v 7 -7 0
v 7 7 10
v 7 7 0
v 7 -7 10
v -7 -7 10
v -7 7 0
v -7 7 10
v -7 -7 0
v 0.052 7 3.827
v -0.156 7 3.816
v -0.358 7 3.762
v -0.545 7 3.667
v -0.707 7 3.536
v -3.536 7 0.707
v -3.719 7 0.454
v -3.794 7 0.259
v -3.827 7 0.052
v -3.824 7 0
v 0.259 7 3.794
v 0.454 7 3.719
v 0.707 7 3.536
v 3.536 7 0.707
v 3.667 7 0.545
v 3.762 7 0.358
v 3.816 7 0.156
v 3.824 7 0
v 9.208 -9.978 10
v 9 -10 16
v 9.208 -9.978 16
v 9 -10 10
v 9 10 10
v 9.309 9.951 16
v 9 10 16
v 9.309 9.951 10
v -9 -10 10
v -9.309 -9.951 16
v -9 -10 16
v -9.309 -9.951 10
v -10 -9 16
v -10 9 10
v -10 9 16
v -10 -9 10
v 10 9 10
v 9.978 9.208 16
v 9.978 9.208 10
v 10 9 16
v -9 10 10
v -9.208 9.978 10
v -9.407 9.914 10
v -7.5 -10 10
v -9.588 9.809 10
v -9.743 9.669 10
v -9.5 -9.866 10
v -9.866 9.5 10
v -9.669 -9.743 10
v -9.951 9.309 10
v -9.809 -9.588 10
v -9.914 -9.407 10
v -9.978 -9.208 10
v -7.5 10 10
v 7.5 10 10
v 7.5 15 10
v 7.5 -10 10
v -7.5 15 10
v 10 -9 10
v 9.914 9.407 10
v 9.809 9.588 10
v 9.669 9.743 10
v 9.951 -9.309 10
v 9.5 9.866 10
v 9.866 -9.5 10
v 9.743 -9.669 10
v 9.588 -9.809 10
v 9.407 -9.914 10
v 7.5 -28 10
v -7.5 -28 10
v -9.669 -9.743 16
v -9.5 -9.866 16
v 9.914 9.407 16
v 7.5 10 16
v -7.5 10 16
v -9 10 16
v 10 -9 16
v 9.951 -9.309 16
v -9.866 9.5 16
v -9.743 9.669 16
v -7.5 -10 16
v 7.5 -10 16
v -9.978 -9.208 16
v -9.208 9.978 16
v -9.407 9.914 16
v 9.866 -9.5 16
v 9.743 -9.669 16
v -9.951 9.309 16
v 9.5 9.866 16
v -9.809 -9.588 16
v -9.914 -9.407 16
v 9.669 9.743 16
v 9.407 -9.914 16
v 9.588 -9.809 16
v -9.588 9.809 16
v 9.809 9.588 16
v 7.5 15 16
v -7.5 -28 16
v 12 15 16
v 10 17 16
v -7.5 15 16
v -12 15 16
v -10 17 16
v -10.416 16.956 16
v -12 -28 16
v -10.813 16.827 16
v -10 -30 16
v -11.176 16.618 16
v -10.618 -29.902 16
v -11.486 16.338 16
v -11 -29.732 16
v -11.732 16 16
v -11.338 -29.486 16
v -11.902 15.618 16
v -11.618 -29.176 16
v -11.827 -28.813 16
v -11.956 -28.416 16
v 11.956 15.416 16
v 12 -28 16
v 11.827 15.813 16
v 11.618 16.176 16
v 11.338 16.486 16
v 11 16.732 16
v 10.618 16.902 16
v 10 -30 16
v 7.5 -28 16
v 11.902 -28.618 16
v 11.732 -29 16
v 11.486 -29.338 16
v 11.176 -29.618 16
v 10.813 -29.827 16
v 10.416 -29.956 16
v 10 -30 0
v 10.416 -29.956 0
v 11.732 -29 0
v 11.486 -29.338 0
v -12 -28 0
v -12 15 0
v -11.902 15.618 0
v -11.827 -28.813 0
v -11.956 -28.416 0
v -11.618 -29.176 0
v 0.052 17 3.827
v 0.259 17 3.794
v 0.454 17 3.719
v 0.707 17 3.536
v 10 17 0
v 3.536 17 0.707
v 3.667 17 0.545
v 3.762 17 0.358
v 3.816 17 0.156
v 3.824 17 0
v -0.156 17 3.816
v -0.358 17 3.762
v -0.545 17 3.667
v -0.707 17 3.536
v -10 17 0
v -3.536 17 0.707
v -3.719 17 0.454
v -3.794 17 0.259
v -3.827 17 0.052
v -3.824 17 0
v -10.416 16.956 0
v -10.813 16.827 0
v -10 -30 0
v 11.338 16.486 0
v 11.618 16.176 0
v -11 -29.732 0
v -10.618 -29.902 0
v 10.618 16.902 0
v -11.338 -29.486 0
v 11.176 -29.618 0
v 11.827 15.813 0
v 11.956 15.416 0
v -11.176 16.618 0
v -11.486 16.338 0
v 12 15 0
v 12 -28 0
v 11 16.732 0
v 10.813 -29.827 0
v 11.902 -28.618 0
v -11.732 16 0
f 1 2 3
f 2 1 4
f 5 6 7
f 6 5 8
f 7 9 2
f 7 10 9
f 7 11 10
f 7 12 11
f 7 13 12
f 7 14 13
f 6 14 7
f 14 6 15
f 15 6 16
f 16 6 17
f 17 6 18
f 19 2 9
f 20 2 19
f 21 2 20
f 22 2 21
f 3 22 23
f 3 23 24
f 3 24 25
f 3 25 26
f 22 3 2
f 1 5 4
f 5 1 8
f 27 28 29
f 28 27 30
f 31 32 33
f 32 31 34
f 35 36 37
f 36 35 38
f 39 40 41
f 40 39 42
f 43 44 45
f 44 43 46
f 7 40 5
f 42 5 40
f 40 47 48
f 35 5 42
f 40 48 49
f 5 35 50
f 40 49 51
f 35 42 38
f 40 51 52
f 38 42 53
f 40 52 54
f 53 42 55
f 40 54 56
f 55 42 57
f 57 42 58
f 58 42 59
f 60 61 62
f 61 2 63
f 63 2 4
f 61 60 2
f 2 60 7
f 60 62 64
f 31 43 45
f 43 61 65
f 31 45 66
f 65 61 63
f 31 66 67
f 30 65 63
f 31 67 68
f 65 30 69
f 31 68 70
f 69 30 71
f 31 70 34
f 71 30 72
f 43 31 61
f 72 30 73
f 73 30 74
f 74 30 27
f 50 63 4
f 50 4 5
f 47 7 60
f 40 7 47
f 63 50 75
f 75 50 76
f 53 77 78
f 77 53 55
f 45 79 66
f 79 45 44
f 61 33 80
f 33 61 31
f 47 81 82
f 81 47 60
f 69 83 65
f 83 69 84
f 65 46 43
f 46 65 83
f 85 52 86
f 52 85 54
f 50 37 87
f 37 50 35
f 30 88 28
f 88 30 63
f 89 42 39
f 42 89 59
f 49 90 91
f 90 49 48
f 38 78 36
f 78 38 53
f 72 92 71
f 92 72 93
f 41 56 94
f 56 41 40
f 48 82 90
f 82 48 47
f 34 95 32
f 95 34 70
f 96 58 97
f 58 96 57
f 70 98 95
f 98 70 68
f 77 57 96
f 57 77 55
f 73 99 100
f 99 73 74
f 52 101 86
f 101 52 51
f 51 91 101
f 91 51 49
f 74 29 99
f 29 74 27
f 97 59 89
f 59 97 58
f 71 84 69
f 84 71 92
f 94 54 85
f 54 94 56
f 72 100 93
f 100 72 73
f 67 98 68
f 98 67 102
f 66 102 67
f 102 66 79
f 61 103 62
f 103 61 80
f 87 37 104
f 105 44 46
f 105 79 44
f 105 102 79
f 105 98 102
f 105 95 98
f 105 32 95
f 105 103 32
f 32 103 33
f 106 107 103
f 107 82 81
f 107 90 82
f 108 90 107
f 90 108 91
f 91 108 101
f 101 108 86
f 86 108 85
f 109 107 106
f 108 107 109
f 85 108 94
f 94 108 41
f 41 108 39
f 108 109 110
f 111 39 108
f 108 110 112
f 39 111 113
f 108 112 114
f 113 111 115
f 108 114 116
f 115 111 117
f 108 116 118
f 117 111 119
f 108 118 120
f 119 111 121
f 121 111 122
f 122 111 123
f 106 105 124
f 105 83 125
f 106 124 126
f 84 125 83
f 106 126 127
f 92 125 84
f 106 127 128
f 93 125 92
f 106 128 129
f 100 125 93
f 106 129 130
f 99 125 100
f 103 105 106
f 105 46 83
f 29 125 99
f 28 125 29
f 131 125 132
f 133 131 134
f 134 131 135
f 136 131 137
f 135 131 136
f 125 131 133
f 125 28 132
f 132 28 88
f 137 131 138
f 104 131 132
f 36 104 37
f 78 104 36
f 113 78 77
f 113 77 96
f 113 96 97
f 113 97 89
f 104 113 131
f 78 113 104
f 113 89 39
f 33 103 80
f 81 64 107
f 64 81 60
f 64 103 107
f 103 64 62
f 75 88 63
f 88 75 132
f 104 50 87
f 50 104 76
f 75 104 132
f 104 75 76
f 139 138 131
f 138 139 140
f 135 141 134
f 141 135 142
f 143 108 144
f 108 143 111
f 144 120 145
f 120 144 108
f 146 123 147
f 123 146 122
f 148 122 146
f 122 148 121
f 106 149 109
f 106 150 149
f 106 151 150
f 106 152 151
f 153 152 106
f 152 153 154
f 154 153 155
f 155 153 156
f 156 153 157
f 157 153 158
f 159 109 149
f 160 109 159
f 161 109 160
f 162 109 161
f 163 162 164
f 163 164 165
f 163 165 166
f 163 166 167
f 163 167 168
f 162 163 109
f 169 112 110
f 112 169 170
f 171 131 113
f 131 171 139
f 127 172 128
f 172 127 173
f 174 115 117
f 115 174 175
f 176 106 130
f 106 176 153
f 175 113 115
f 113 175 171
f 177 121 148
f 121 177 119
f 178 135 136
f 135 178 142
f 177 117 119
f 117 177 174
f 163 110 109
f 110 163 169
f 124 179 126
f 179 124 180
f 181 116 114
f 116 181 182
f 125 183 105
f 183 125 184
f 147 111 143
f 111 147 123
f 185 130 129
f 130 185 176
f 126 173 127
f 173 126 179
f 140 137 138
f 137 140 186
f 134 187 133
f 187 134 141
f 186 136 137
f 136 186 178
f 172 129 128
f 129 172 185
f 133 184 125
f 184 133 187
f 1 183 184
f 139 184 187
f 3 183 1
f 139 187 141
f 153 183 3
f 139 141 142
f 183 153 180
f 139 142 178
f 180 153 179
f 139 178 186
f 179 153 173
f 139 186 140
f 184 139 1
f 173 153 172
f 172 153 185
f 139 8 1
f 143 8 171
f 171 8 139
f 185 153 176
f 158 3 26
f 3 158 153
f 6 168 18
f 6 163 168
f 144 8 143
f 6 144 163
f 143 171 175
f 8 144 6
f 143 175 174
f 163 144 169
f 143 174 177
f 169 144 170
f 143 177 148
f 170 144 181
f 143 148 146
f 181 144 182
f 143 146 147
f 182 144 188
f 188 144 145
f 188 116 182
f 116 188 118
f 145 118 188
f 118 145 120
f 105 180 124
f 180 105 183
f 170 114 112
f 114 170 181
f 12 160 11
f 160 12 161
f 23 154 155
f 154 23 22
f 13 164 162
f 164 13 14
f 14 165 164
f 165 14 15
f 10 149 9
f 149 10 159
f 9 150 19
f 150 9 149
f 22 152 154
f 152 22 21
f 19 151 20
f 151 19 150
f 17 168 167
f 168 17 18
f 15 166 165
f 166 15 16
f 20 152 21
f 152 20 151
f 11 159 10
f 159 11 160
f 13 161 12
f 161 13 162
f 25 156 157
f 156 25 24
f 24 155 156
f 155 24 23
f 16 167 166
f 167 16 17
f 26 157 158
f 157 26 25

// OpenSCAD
use <trackball.scad>
// Test base for recessed button cutouts.

$fn=30;

module button_test_base(front_overhang, back_overhang)
{
    difference()
    {
        border = 2;

        front_extra = ((front_overhang > 0)?(front_overhang + 3):(3));
        back_extra = ((back_overhang > 0)?(back_overhang + 1):(3));
        length = border + front_extra + 14 + back_extra + border;
        offset_adjustment = (front_extra - back_extra) / 2;

        // main body
        translate([0, offset_adjustment, 0])
        rcube(border + 20 + border, length, 16, 2);
        
        // wire tunnel
        rotate([-90, 0, 0])
        rotate([0, 0, 45])
        rcube(6, 6, 60, 1);
        
        translate([0, 0, 10])
        {
            // switch cutout
            button_cutout(front_overhang, back_overhang);
            shadow_hull()
            button_access_base();
        }
        
    }
}

button_test_base(5, 20);
